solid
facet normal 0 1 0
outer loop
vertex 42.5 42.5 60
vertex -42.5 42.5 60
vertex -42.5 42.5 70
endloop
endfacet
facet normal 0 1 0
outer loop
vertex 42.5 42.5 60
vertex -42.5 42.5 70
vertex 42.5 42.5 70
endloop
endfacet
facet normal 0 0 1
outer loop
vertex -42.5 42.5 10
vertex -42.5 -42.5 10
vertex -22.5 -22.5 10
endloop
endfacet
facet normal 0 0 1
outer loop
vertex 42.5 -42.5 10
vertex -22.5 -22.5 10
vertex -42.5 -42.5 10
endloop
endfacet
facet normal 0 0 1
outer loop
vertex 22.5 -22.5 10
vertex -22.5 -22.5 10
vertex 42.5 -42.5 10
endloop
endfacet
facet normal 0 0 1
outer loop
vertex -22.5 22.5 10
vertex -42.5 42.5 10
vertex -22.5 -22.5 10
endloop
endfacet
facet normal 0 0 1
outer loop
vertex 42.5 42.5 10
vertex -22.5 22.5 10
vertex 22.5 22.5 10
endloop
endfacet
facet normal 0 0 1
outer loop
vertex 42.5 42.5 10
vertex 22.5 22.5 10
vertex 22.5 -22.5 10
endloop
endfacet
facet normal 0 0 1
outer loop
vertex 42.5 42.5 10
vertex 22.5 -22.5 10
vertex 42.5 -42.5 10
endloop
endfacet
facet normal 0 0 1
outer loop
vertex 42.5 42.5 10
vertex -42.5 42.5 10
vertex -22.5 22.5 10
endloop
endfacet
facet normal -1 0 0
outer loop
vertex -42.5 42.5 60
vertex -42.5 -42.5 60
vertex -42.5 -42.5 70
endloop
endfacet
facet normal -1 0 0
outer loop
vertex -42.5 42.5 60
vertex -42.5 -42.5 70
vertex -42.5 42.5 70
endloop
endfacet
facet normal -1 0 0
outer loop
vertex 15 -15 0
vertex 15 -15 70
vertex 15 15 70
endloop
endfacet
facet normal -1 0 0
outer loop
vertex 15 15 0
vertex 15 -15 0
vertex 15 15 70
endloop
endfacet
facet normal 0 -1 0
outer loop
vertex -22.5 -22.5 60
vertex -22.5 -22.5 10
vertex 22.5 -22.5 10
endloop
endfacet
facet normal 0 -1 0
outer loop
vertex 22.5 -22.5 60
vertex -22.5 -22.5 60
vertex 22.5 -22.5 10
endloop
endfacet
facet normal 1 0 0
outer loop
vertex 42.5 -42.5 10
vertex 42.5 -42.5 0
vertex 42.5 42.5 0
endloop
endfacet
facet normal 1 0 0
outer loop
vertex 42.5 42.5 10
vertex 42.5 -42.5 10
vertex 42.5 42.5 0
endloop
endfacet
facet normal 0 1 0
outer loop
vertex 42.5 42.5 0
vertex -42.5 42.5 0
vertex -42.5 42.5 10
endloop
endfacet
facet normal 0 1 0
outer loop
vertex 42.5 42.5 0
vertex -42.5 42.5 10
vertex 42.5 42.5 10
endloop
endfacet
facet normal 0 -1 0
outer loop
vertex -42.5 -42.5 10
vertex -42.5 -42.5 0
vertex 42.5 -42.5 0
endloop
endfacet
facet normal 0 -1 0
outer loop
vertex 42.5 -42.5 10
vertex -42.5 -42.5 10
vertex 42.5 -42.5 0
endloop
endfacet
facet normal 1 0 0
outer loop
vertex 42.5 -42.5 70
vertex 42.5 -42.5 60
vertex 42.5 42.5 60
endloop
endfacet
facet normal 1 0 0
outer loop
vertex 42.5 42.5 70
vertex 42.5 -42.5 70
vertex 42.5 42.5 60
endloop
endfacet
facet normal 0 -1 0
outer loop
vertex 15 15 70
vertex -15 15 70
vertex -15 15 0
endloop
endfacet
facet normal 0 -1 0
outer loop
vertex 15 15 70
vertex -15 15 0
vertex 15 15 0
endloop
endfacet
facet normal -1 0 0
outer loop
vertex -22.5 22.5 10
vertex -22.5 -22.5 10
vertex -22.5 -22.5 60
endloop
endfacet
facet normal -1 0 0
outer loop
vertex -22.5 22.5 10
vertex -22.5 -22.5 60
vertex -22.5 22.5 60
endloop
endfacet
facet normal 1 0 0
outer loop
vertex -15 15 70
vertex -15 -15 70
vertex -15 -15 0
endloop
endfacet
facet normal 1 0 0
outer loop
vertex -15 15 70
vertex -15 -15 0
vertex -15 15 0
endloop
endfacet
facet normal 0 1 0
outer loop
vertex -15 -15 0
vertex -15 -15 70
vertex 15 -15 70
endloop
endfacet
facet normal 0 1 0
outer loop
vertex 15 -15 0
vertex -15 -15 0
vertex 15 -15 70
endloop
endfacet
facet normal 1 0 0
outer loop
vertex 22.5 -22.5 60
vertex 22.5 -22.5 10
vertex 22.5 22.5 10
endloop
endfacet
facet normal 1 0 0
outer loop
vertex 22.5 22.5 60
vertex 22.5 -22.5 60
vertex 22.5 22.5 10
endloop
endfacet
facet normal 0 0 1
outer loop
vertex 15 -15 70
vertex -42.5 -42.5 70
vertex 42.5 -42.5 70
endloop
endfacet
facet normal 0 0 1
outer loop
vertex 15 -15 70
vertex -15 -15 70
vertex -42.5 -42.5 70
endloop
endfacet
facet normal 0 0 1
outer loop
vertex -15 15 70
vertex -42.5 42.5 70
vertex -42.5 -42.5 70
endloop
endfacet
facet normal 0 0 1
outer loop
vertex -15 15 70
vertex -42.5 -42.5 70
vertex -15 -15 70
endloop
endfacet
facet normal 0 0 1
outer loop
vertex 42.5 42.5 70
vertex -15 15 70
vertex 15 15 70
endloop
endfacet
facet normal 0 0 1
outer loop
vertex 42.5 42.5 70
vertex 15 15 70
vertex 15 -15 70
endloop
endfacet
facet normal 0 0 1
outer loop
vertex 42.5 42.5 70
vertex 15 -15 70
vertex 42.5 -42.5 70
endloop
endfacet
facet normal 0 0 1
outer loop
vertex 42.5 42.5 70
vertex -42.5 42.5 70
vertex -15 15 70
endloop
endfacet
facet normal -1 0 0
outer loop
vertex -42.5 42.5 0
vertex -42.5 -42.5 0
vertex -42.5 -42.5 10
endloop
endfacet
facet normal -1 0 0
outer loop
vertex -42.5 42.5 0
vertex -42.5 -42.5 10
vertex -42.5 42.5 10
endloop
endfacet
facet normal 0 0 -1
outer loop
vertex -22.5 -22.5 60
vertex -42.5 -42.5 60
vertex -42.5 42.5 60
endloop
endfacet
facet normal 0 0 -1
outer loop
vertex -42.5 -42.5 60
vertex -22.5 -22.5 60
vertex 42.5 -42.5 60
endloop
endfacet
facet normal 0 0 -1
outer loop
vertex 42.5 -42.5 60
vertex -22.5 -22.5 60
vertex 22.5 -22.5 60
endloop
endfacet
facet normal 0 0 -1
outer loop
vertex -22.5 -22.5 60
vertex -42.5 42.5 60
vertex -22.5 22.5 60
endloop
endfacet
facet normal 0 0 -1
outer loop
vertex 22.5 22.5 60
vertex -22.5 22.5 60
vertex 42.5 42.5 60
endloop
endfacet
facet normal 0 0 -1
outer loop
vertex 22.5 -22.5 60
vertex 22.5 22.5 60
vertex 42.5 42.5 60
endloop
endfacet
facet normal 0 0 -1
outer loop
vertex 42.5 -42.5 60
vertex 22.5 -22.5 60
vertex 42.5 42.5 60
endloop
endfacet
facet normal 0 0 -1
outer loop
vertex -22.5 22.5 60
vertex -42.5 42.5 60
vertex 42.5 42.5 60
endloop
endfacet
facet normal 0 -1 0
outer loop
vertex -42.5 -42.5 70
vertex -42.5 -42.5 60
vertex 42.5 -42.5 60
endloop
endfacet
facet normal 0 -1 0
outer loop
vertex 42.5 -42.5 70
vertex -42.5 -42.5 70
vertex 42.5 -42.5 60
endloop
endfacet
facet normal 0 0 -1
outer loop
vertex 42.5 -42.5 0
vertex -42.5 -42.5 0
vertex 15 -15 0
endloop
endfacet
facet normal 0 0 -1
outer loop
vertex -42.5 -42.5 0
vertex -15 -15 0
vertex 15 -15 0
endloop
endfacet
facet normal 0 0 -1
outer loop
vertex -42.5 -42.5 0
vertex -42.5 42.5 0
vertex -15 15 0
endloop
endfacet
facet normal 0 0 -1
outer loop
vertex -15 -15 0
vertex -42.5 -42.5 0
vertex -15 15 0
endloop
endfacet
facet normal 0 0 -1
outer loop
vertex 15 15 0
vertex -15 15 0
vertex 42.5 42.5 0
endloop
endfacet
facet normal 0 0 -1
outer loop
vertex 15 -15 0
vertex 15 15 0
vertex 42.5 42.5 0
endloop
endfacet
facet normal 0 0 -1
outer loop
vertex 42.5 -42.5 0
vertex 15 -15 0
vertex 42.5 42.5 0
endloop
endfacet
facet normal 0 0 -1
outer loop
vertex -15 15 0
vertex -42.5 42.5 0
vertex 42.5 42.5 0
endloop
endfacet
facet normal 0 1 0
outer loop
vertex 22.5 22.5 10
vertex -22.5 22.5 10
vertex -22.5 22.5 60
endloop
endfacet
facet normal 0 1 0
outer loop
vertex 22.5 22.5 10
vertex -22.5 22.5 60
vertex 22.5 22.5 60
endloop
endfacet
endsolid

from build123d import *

# Parameters (mm, degrees)
F0_W     = 85
F0_H     = 85
F1_DEPTH = 10
F2_W     = 45
F2_H     = 45
F3_DEPTH = 50
F4_W     = 85
F4_H     = 85
F5_DEPTH = 10
F6_W     = 30
F6_H     = 30
F7_DEPTH = 70


with BuildPart() as f1:
    # F0 (on Top) → F1 (new body)
    with BuildSketch(Plane.XY):
        Rectangle(F0_W, F0_H)
    extrude(amount=F1_DEPTH)

    # F2 (on face) → F3 (join)
    with BuildSketch(Plane.XY.offset(10)):
        Rectangle(F2_W, F2_H)
    extrude(amount=F3_DEPTH)

    # F4 (on face) → F5 (join)
    with BuildSketch(Plane.XY.offset(60)):
        Rectangle(F4_W, F4_H)
    extrude(amount=F5_DEPTH)

    # F6 (on face) → F7 (cut)
    with BuildSketch(Plane.XY.offset(70)):
        Rectangle(F6_W, F6_H)
    extrude(amount=-F7_DEPTH, mode=Mode.SUBTRACT)


solid = f1.part
